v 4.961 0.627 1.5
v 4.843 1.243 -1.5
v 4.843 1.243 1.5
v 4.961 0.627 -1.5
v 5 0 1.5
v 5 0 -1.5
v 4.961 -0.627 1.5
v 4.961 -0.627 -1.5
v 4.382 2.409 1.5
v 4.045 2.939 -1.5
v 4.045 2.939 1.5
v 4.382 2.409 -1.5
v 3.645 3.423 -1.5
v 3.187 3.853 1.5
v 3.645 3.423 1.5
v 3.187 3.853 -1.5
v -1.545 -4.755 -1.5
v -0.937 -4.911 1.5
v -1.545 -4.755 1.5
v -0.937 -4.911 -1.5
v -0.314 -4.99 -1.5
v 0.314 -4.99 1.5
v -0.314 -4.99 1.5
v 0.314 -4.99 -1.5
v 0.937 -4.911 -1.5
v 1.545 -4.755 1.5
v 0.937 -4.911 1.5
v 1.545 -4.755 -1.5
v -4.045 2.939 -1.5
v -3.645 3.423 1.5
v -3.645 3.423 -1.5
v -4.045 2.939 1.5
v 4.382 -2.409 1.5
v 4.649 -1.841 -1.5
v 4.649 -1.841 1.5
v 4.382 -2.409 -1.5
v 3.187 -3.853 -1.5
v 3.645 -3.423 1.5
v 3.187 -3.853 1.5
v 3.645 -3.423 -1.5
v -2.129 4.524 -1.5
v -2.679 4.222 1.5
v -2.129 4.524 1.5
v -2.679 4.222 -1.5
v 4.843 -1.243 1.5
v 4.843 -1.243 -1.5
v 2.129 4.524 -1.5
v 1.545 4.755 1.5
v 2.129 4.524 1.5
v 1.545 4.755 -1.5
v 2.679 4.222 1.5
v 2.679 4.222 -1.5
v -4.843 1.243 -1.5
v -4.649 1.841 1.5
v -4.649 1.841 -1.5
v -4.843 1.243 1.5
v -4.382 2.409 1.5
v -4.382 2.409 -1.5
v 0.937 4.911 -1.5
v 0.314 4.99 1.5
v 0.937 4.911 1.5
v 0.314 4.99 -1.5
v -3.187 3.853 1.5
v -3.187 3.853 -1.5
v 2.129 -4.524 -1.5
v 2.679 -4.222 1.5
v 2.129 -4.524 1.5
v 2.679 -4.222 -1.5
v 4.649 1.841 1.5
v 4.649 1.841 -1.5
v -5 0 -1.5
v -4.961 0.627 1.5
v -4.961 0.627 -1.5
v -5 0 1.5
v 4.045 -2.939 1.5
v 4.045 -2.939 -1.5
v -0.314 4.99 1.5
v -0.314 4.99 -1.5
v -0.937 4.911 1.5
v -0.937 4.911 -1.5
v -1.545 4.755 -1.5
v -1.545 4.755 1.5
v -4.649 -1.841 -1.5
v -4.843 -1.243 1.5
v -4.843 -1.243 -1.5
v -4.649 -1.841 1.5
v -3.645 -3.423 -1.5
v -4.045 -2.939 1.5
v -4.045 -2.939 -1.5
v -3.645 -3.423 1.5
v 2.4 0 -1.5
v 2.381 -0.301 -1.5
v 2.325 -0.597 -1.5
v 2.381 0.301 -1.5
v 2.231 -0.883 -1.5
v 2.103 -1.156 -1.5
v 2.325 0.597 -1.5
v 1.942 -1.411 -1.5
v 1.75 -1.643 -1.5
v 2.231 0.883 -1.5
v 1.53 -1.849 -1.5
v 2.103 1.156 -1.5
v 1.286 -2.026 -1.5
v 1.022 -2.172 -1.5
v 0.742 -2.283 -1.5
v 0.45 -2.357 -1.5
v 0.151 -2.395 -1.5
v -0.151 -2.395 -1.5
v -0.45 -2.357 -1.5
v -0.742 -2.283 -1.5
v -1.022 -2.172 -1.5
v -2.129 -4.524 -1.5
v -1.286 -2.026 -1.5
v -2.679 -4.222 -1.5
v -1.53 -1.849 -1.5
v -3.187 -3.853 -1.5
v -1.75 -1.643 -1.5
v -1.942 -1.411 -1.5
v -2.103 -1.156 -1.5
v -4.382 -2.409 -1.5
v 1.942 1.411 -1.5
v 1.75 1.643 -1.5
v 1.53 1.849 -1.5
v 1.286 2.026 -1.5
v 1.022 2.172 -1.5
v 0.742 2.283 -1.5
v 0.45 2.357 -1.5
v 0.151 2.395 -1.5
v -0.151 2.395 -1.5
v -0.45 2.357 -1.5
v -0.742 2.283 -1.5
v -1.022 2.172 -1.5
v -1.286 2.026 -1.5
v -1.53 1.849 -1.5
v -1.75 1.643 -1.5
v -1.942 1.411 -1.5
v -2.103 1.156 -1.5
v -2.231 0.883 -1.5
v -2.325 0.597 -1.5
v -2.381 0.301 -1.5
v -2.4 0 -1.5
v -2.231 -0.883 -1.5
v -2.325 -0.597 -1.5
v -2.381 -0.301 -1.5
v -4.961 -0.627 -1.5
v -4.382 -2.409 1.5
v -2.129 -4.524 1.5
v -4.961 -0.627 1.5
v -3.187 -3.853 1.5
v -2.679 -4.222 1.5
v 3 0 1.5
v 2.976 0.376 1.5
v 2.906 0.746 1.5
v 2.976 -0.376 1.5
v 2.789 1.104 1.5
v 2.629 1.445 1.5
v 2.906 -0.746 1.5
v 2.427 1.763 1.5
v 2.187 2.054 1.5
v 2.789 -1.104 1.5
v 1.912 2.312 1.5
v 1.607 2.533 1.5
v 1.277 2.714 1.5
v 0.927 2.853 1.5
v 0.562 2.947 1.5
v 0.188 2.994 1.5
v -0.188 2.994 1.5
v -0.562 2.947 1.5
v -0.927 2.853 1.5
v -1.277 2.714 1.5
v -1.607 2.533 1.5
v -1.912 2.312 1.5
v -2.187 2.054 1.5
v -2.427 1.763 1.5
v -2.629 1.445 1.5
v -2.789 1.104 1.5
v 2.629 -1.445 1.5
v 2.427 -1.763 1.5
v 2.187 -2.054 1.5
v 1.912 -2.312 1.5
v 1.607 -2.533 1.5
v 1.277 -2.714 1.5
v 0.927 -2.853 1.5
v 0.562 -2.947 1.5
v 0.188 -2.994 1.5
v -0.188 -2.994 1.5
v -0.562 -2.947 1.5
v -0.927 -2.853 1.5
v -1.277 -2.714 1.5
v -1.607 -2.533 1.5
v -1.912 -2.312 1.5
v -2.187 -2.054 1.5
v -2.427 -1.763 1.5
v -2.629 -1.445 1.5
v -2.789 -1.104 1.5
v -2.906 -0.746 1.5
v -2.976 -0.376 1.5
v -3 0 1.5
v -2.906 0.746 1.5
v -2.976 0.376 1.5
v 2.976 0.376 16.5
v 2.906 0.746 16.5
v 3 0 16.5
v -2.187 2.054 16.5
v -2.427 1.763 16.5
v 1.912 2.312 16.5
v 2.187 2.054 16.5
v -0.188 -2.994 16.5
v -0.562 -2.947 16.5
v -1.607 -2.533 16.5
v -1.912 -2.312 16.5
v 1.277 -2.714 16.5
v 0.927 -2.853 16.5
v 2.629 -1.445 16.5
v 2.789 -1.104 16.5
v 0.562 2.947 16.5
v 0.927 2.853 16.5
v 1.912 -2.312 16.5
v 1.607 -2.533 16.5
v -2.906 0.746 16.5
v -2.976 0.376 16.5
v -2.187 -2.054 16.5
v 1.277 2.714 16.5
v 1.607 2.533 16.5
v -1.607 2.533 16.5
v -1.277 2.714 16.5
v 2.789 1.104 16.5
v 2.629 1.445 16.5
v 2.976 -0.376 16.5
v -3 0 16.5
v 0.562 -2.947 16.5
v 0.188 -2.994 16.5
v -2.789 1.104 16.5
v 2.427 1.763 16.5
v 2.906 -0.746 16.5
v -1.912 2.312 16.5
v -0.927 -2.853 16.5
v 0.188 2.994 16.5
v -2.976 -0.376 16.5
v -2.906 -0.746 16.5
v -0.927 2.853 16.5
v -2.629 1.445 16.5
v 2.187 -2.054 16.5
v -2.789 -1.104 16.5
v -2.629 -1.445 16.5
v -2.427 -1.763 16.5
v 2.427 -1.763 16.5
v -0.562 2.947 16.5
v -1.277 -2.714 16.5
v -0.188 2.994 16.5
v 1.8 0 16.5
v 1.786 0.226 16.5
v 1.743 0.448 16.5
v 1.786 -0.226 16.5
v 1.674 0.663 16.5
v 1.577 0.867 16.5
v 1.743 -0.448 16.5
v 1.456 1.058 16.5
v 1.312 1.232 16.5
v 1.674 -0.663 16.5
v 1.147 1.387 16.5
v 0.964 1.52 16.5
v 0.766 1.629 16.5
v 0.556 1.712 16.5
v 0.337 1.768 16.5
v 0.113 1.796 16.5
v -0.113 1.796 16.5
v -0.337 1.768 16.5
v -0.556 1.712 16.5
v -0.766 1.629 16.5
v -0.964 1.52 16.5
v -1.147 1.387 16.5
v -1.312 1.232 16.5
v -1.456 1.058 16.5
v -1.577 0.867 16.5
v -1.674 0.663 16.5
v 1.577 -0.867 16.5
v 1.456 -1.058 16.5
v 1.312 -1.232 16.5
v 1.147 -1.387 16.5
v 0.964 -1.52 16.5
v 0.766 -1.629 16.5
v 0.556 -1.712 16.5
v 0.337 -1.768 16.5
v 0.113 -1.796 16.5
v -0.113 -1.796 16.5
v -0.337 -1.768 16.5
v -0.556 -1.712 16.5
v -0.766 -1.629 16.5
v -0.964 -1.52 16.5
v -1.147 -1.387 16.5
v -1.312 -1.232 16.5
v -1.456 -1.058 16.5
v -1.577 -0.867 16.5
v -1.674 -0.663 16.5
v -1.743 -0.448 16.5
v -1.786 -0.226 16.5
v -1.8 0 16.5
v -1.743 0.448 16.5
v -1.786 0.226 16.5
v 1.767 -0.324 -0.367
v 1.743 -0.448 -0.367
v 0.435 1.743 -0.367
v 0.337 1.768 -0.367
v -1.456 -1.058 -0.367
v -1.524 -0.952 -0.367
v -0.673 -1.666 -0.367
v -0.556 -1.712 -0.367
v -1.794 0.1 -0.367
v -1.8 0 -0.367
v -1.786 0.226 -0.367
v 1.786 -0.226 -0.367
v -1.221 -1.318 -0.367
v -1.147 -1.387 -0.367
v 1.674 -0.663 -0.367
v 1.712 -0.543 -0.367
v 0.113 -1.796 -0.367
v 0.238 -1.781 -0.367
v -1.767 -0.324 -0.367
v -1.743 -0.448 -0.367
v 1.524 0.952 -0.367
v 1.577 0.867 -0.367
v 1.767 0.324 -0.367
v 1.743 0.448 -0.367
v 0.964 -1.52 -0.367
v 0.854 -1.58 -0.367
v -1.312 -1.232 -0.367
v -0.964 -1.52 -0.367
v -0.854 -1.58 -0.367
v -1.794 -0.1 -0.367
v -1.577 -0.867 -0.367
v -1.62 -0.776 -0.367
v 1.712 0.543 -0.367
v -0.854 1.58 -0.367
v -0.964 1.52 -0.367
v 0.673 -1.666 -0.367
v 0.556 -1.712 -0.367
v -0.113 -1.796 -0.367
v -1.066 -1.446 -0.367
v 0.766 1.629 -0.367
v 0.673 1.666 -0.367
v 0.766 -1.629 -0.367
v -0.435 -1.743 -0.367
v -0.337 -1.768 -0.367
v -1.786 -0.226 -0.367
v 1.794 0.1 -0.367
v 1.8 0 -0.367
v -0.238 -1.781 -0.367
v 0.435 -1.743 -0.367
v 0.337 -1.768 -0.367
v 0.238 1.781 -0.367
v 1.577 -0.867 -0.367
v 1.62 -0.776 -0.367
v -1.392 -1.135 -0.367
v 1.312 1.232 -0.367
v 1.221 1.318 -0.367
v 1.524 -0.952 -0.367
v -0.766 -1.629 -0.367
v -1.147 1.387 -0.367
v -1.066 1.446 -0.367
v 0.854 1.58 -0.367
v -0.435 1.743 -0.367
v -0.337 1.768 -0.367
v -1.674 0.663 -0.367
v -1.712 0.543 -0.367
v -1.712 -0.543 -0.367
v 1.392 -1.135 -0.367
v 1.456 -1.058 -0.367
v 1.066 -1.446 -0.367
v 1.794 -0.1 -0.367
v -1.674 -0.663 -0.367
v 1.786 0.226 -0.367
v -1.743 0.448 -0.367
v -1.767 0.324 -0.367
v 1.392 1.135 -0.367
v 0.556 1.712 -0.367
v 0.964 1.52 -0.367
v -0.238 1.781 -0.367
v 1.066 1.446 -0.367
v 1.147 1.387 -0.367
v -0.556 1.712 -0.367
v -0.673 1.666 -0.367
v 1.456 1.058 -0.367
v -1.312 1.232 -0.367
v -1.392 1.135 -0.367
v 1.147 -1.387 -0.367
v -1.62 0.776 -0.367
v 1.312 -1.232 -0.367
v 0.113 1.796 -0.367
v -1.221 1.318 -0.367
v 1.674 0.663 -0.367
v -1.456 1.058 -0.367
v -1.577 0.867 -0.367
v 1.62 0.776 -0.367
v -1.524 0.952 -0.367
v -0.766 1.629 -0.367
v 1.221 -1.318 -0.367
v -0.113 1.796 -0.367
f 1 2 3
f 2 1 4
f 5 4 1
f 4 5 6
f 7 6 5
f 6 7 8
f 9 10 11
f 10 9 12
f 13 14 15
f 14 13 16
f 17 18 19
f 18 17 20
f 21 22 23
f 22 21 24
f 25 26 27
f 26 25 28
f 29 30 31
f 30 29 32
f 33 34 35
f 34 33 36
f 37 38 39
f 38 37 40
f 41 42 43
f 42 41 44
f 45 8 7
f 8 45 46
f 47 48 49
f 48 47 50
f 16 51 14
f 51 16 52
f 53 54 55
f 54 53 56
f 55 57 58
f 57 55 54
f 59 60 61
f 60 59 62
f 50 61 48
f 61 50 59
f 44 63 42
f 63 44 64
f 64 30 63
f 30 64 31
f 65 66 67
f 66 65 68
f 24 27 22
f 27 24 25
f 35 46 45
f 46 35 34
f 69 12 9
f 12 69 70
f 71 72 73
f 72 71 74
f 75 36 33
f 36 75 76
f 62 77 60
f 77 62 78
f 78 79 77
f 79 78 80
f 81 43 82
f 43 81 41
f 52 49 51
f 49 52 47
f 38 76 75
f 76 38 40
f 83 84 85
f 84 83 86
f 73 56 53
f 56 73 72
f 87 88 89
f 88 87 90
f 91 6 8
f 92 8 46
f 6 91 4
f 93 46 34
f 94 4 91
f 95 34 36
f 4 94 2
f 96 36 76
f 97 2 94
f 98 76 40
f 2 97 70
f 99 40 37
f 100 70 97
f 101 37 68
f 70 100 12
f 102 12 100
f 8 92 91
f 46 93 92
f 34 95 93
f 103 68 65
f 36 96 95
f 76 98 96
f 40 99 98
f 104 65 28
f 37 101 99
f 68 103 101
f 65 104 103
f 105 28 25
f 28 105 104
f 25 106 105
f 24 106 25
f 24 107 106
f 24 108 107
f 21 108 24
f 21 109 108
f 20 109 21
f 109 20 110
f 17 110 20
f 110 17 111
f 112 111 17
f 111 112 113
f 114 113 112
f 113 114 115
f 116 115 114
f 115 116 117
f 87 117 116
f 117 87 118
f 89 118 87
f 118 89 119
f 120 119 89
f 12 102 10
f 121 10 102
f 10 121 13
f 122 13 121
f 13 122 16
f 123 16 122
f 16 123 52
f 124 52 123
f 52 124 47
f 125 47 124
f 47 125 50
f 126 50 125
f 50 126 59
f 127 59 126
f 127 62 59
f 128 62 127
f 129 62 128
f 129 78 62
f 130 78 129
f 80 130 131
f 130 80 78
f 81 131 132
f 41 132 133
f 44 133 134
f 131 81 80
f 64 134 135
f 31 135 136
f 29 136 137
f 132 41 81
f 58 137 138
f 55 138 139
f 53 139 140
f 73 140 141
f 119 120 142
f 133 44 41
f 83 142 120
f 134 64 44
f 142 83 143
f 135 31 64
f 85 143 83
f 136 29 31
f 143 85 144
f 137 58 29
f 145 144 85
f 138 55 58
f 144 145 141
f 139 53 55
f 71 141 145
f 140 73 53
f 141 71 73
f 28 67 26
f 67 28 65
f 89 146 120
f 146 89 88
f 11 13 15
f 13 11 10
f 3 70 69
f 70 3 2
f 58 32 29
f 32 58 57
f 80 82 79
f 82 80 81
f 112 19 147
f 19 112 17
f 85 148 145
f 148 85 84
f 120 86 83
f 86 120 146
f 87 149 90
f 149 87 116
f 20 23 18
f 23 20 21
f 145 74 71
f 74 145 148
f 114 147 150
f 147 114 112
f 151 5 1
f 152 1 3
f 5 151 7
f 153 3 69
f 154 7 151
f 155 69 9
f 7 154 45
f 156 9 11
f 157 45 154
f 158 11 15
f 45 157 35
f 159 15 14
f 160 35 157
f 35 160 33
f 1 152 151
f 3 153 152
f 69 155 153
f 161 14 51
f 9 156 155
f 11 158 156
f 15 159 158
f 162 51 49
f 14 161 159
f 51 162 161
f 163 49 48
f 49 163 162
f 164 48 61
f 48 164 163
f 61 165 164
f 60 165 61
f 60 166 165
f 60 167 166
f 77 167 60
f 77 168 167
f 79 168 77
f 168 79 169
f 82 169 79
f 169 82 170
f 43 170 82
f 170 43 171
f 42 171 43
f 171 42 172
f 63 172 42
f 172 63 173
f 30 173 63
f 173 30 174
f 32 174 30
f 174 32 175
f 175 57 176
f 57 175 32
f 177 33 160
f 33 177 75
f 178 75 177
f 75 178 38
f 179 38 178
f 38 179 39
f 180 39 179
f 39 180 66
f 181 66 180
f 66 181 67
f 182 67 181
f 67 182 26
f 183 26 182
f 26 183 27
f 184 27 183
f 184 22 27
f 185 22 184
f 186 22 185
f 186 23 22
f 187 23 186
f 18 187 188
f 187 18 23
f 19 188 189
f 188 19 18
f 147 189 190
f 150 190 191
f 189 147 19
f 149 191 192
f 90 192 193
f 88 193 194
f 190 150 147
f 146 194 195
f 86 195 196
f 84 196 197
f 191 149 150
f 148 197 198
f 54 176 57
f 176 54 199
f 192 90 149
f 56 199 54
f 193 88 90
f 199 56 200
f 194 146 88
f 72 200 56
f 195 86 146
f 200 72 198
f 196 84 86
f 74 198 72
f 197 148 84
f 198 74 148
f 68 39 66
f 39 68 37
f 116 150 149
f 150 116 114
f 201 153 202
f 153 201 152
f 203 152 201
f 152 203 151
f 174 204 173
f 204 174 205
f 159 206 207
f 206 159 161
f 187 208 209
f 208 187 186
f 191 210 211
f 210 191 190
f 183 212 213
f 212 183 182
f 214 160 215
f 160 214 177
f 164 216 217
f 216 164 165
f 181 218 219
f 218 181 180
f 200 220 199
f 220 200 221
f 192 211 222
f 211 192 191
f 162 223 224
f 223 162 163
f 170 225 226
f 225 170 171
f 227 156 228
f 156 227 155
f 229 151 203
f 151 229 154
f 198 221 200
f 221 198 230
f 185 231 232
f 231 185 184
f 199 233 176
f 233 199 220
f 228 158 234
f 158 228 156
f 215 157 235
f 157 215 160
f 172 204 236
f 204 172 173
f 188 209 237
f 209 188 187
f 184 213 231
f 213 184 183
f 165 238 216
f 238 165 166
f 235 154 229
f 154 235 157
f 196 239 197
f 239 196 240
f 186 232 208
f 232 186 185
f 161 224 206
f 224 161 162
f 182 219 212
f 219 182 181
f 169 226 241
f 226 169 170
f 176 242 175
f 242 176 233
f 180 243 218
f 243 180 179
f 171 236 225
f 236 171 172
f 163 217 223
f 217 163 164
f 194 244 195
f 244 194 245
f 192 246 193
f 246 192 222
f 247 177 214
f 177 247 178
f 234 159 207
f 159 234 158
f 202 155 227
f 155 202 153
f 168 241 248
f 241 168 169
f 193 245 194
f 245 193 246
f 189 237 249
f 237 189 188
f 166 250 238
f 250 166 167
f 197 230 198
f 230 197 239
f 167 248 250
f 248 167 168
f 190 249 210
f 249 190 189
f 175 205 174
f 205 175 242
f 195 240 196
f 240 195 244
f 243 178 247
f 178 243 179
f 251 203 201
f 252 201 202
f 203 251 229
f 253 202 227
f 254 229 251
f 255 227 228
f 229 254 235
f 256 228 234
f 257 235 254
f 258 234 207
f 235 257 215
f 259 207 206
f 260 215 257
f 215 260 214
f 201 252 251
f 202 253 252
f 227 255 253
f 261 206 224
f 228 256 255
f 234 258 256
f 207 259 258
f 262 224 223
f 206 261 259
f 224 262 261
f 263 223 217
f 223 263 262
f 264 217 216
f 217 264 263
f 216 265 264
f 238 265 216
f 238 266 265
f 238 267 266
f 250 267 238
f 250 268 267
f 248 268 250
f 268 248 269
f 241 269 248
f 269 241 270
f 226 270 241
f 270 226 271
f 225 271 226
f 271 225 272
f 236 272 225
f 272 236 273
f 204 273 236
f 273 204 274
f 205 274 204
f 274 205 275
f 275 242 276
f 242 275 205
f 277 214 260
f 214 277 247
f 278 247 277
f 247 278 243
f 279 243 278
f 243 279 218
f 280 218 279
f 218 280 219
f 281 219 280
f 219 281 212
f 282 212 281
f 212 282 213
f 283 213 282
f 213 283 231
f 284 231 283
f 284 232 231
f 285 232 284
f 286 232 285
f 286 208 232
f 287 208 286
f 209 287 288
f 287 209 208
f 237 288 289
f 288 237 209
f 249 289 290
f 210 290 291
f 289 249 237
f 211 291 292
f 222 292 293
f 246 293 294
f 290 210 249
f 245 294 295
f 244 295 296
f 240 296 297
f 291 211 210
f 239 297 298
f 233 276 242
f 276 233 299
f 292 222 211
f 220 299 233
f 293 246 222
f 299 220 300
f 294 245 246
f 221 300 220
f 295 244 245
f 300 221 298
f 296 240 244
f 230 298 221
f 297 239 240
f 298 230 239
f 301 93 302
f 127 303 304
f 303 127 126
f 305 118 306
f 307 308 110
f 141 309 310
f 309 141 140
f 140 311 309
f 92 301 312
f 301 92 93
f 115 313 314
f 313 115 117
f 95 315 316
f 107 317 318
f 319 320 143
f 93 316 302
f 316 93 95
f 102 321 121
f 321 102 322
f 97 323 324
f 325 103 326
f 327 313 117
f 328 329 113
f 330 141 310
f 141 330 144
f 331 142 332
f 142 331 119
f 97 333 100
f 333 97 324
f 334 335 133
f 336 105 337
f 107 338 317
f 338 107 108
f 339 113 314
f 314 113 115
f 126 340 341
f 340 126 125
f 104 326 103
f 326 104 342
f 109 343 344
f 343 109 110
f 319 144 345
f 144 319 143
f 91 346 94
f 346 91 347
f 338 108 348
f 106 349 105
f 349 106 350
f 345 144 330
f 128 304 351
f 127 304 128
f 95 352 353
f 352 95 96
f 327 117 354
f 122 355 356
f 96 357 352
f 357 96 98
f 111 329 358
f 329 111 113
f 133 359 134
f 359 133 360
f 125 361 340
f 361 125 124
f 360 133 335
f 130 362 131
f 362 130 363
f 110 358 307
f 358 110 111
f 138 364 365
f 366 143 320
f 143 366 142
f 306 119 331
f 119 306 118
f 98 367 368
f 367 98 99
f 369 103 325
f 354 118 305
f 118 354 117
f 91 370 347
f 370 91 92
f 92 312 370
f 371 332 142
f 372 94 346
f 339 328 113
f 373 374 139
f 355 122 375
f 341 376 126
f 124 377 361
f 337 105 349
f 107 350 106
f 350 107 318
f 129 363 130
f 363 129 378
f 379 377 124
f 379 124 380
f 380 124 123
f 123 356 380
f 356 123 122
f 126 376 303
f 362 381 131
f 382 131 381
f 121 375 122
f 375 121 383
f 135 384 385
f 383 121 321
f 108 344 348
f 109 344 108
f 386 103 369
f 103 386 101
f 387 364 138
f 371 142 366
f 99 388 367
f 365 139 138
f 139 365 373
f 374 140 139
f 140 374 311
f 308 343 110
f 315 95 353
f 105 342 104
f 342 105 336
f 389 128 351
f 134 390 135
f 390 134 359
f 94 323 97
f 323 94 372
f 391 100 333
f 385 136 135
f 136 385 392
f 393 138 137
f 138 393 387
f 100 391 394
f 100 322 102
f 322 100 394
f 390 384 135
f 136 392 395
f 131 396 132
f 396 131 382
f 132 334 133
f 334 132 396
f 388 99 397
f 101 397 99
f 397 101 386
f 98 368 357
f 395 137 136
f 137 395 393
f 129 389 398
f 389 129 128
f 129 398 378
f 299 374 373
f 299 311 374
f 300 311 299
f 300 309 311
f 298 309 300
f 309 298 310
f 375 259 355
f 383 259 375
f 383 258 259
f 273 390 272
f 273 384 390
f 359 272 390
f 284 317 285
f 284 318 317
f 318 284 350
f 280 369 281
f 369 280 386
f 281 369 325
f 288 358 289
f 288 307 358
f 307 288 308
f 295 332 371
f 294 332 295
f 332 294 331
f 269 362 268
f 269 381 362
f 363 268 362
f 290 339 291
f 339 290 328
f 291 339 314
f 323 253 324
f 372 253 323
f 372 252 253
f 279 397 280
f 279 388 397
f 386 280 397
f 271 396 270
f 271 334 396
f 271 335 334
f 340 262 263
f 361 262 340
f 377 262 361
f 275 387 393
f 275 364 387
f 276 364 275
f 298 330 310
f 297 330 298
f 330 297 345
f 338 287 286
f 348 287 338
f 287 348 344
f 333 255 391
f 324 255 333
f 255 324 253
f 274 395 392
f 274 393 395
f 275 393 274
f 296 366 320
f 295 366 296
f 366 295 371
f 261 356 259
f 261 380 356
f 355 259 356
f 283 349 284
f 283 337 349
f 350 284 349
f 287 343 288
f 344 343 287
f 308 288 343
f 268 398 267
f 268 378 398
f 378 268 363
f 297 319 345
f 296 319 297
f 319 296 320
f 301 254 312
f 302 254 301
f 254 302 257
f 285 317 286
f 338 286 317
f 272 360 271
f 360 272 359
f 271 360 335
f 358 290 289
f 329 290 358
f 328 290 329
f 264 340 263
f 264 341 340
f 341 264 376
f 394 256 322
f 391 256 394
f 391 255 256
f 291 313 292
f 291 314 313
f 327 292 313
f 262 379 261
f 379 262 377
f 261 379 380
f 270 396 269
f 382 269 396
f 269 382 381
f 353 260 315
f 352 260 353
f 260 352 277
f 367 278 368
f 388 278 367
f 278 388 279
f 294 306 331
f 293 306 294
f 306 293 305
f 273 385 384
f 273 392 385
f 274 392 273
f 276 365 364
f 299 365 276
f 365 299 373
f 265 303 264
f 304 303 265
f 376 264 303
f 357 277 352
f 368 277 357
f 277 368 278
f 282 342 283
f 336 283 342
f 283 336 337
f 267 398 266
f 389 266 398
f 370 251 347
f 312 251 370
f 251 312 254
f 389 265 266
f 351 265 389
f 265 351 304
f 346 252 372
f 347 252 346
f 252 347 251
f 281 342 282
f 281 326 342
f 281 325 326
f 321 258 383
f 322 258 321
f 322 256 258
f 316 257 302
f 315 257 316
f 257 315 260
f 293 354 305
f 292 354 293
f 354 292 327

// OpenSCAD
$fn = 50;


difference() {
	union() {
		translate(v = [0, 0, -1.5000000000]) {
			cylinder(h = 3, r = 5.0000000000);
		}
		translate(v = [0, 0, -1.5000000000]) {
			cylinder(h = 18, r = 3.0000000000);
		}
	}
	union() {
		translate(v = [0, 0, -1.5000000000]) {
			rotate(a = [0, 180, 0]) {
				difference() {
					union() {
						translate(v = [0, 0, -1.7000000000]) {
							cylinder(h = 1.7000000000, r1 = 1.5000000000, r2 = 2.4000000000);
						}
						translate(v = [0, 0, -18.0000000000]) {
							cylinder(h = 18, r = 1.5000000000);
						}
						translate(v = [0, 0, -18.0000000000]) {
							cylinder(h = 18, r = 1.8000000000);
						}
						translate(v = [0, 0, -18.0000000000]) {
							cylinder(h = 18, r = 1.5000000000);
						}
					}
					union();
				}
			}
		}
		translate(v = [0, 0, -100.0000000000]) {
			cylinder(h = 200, r = 1.5000000000);
		}
	}
}
